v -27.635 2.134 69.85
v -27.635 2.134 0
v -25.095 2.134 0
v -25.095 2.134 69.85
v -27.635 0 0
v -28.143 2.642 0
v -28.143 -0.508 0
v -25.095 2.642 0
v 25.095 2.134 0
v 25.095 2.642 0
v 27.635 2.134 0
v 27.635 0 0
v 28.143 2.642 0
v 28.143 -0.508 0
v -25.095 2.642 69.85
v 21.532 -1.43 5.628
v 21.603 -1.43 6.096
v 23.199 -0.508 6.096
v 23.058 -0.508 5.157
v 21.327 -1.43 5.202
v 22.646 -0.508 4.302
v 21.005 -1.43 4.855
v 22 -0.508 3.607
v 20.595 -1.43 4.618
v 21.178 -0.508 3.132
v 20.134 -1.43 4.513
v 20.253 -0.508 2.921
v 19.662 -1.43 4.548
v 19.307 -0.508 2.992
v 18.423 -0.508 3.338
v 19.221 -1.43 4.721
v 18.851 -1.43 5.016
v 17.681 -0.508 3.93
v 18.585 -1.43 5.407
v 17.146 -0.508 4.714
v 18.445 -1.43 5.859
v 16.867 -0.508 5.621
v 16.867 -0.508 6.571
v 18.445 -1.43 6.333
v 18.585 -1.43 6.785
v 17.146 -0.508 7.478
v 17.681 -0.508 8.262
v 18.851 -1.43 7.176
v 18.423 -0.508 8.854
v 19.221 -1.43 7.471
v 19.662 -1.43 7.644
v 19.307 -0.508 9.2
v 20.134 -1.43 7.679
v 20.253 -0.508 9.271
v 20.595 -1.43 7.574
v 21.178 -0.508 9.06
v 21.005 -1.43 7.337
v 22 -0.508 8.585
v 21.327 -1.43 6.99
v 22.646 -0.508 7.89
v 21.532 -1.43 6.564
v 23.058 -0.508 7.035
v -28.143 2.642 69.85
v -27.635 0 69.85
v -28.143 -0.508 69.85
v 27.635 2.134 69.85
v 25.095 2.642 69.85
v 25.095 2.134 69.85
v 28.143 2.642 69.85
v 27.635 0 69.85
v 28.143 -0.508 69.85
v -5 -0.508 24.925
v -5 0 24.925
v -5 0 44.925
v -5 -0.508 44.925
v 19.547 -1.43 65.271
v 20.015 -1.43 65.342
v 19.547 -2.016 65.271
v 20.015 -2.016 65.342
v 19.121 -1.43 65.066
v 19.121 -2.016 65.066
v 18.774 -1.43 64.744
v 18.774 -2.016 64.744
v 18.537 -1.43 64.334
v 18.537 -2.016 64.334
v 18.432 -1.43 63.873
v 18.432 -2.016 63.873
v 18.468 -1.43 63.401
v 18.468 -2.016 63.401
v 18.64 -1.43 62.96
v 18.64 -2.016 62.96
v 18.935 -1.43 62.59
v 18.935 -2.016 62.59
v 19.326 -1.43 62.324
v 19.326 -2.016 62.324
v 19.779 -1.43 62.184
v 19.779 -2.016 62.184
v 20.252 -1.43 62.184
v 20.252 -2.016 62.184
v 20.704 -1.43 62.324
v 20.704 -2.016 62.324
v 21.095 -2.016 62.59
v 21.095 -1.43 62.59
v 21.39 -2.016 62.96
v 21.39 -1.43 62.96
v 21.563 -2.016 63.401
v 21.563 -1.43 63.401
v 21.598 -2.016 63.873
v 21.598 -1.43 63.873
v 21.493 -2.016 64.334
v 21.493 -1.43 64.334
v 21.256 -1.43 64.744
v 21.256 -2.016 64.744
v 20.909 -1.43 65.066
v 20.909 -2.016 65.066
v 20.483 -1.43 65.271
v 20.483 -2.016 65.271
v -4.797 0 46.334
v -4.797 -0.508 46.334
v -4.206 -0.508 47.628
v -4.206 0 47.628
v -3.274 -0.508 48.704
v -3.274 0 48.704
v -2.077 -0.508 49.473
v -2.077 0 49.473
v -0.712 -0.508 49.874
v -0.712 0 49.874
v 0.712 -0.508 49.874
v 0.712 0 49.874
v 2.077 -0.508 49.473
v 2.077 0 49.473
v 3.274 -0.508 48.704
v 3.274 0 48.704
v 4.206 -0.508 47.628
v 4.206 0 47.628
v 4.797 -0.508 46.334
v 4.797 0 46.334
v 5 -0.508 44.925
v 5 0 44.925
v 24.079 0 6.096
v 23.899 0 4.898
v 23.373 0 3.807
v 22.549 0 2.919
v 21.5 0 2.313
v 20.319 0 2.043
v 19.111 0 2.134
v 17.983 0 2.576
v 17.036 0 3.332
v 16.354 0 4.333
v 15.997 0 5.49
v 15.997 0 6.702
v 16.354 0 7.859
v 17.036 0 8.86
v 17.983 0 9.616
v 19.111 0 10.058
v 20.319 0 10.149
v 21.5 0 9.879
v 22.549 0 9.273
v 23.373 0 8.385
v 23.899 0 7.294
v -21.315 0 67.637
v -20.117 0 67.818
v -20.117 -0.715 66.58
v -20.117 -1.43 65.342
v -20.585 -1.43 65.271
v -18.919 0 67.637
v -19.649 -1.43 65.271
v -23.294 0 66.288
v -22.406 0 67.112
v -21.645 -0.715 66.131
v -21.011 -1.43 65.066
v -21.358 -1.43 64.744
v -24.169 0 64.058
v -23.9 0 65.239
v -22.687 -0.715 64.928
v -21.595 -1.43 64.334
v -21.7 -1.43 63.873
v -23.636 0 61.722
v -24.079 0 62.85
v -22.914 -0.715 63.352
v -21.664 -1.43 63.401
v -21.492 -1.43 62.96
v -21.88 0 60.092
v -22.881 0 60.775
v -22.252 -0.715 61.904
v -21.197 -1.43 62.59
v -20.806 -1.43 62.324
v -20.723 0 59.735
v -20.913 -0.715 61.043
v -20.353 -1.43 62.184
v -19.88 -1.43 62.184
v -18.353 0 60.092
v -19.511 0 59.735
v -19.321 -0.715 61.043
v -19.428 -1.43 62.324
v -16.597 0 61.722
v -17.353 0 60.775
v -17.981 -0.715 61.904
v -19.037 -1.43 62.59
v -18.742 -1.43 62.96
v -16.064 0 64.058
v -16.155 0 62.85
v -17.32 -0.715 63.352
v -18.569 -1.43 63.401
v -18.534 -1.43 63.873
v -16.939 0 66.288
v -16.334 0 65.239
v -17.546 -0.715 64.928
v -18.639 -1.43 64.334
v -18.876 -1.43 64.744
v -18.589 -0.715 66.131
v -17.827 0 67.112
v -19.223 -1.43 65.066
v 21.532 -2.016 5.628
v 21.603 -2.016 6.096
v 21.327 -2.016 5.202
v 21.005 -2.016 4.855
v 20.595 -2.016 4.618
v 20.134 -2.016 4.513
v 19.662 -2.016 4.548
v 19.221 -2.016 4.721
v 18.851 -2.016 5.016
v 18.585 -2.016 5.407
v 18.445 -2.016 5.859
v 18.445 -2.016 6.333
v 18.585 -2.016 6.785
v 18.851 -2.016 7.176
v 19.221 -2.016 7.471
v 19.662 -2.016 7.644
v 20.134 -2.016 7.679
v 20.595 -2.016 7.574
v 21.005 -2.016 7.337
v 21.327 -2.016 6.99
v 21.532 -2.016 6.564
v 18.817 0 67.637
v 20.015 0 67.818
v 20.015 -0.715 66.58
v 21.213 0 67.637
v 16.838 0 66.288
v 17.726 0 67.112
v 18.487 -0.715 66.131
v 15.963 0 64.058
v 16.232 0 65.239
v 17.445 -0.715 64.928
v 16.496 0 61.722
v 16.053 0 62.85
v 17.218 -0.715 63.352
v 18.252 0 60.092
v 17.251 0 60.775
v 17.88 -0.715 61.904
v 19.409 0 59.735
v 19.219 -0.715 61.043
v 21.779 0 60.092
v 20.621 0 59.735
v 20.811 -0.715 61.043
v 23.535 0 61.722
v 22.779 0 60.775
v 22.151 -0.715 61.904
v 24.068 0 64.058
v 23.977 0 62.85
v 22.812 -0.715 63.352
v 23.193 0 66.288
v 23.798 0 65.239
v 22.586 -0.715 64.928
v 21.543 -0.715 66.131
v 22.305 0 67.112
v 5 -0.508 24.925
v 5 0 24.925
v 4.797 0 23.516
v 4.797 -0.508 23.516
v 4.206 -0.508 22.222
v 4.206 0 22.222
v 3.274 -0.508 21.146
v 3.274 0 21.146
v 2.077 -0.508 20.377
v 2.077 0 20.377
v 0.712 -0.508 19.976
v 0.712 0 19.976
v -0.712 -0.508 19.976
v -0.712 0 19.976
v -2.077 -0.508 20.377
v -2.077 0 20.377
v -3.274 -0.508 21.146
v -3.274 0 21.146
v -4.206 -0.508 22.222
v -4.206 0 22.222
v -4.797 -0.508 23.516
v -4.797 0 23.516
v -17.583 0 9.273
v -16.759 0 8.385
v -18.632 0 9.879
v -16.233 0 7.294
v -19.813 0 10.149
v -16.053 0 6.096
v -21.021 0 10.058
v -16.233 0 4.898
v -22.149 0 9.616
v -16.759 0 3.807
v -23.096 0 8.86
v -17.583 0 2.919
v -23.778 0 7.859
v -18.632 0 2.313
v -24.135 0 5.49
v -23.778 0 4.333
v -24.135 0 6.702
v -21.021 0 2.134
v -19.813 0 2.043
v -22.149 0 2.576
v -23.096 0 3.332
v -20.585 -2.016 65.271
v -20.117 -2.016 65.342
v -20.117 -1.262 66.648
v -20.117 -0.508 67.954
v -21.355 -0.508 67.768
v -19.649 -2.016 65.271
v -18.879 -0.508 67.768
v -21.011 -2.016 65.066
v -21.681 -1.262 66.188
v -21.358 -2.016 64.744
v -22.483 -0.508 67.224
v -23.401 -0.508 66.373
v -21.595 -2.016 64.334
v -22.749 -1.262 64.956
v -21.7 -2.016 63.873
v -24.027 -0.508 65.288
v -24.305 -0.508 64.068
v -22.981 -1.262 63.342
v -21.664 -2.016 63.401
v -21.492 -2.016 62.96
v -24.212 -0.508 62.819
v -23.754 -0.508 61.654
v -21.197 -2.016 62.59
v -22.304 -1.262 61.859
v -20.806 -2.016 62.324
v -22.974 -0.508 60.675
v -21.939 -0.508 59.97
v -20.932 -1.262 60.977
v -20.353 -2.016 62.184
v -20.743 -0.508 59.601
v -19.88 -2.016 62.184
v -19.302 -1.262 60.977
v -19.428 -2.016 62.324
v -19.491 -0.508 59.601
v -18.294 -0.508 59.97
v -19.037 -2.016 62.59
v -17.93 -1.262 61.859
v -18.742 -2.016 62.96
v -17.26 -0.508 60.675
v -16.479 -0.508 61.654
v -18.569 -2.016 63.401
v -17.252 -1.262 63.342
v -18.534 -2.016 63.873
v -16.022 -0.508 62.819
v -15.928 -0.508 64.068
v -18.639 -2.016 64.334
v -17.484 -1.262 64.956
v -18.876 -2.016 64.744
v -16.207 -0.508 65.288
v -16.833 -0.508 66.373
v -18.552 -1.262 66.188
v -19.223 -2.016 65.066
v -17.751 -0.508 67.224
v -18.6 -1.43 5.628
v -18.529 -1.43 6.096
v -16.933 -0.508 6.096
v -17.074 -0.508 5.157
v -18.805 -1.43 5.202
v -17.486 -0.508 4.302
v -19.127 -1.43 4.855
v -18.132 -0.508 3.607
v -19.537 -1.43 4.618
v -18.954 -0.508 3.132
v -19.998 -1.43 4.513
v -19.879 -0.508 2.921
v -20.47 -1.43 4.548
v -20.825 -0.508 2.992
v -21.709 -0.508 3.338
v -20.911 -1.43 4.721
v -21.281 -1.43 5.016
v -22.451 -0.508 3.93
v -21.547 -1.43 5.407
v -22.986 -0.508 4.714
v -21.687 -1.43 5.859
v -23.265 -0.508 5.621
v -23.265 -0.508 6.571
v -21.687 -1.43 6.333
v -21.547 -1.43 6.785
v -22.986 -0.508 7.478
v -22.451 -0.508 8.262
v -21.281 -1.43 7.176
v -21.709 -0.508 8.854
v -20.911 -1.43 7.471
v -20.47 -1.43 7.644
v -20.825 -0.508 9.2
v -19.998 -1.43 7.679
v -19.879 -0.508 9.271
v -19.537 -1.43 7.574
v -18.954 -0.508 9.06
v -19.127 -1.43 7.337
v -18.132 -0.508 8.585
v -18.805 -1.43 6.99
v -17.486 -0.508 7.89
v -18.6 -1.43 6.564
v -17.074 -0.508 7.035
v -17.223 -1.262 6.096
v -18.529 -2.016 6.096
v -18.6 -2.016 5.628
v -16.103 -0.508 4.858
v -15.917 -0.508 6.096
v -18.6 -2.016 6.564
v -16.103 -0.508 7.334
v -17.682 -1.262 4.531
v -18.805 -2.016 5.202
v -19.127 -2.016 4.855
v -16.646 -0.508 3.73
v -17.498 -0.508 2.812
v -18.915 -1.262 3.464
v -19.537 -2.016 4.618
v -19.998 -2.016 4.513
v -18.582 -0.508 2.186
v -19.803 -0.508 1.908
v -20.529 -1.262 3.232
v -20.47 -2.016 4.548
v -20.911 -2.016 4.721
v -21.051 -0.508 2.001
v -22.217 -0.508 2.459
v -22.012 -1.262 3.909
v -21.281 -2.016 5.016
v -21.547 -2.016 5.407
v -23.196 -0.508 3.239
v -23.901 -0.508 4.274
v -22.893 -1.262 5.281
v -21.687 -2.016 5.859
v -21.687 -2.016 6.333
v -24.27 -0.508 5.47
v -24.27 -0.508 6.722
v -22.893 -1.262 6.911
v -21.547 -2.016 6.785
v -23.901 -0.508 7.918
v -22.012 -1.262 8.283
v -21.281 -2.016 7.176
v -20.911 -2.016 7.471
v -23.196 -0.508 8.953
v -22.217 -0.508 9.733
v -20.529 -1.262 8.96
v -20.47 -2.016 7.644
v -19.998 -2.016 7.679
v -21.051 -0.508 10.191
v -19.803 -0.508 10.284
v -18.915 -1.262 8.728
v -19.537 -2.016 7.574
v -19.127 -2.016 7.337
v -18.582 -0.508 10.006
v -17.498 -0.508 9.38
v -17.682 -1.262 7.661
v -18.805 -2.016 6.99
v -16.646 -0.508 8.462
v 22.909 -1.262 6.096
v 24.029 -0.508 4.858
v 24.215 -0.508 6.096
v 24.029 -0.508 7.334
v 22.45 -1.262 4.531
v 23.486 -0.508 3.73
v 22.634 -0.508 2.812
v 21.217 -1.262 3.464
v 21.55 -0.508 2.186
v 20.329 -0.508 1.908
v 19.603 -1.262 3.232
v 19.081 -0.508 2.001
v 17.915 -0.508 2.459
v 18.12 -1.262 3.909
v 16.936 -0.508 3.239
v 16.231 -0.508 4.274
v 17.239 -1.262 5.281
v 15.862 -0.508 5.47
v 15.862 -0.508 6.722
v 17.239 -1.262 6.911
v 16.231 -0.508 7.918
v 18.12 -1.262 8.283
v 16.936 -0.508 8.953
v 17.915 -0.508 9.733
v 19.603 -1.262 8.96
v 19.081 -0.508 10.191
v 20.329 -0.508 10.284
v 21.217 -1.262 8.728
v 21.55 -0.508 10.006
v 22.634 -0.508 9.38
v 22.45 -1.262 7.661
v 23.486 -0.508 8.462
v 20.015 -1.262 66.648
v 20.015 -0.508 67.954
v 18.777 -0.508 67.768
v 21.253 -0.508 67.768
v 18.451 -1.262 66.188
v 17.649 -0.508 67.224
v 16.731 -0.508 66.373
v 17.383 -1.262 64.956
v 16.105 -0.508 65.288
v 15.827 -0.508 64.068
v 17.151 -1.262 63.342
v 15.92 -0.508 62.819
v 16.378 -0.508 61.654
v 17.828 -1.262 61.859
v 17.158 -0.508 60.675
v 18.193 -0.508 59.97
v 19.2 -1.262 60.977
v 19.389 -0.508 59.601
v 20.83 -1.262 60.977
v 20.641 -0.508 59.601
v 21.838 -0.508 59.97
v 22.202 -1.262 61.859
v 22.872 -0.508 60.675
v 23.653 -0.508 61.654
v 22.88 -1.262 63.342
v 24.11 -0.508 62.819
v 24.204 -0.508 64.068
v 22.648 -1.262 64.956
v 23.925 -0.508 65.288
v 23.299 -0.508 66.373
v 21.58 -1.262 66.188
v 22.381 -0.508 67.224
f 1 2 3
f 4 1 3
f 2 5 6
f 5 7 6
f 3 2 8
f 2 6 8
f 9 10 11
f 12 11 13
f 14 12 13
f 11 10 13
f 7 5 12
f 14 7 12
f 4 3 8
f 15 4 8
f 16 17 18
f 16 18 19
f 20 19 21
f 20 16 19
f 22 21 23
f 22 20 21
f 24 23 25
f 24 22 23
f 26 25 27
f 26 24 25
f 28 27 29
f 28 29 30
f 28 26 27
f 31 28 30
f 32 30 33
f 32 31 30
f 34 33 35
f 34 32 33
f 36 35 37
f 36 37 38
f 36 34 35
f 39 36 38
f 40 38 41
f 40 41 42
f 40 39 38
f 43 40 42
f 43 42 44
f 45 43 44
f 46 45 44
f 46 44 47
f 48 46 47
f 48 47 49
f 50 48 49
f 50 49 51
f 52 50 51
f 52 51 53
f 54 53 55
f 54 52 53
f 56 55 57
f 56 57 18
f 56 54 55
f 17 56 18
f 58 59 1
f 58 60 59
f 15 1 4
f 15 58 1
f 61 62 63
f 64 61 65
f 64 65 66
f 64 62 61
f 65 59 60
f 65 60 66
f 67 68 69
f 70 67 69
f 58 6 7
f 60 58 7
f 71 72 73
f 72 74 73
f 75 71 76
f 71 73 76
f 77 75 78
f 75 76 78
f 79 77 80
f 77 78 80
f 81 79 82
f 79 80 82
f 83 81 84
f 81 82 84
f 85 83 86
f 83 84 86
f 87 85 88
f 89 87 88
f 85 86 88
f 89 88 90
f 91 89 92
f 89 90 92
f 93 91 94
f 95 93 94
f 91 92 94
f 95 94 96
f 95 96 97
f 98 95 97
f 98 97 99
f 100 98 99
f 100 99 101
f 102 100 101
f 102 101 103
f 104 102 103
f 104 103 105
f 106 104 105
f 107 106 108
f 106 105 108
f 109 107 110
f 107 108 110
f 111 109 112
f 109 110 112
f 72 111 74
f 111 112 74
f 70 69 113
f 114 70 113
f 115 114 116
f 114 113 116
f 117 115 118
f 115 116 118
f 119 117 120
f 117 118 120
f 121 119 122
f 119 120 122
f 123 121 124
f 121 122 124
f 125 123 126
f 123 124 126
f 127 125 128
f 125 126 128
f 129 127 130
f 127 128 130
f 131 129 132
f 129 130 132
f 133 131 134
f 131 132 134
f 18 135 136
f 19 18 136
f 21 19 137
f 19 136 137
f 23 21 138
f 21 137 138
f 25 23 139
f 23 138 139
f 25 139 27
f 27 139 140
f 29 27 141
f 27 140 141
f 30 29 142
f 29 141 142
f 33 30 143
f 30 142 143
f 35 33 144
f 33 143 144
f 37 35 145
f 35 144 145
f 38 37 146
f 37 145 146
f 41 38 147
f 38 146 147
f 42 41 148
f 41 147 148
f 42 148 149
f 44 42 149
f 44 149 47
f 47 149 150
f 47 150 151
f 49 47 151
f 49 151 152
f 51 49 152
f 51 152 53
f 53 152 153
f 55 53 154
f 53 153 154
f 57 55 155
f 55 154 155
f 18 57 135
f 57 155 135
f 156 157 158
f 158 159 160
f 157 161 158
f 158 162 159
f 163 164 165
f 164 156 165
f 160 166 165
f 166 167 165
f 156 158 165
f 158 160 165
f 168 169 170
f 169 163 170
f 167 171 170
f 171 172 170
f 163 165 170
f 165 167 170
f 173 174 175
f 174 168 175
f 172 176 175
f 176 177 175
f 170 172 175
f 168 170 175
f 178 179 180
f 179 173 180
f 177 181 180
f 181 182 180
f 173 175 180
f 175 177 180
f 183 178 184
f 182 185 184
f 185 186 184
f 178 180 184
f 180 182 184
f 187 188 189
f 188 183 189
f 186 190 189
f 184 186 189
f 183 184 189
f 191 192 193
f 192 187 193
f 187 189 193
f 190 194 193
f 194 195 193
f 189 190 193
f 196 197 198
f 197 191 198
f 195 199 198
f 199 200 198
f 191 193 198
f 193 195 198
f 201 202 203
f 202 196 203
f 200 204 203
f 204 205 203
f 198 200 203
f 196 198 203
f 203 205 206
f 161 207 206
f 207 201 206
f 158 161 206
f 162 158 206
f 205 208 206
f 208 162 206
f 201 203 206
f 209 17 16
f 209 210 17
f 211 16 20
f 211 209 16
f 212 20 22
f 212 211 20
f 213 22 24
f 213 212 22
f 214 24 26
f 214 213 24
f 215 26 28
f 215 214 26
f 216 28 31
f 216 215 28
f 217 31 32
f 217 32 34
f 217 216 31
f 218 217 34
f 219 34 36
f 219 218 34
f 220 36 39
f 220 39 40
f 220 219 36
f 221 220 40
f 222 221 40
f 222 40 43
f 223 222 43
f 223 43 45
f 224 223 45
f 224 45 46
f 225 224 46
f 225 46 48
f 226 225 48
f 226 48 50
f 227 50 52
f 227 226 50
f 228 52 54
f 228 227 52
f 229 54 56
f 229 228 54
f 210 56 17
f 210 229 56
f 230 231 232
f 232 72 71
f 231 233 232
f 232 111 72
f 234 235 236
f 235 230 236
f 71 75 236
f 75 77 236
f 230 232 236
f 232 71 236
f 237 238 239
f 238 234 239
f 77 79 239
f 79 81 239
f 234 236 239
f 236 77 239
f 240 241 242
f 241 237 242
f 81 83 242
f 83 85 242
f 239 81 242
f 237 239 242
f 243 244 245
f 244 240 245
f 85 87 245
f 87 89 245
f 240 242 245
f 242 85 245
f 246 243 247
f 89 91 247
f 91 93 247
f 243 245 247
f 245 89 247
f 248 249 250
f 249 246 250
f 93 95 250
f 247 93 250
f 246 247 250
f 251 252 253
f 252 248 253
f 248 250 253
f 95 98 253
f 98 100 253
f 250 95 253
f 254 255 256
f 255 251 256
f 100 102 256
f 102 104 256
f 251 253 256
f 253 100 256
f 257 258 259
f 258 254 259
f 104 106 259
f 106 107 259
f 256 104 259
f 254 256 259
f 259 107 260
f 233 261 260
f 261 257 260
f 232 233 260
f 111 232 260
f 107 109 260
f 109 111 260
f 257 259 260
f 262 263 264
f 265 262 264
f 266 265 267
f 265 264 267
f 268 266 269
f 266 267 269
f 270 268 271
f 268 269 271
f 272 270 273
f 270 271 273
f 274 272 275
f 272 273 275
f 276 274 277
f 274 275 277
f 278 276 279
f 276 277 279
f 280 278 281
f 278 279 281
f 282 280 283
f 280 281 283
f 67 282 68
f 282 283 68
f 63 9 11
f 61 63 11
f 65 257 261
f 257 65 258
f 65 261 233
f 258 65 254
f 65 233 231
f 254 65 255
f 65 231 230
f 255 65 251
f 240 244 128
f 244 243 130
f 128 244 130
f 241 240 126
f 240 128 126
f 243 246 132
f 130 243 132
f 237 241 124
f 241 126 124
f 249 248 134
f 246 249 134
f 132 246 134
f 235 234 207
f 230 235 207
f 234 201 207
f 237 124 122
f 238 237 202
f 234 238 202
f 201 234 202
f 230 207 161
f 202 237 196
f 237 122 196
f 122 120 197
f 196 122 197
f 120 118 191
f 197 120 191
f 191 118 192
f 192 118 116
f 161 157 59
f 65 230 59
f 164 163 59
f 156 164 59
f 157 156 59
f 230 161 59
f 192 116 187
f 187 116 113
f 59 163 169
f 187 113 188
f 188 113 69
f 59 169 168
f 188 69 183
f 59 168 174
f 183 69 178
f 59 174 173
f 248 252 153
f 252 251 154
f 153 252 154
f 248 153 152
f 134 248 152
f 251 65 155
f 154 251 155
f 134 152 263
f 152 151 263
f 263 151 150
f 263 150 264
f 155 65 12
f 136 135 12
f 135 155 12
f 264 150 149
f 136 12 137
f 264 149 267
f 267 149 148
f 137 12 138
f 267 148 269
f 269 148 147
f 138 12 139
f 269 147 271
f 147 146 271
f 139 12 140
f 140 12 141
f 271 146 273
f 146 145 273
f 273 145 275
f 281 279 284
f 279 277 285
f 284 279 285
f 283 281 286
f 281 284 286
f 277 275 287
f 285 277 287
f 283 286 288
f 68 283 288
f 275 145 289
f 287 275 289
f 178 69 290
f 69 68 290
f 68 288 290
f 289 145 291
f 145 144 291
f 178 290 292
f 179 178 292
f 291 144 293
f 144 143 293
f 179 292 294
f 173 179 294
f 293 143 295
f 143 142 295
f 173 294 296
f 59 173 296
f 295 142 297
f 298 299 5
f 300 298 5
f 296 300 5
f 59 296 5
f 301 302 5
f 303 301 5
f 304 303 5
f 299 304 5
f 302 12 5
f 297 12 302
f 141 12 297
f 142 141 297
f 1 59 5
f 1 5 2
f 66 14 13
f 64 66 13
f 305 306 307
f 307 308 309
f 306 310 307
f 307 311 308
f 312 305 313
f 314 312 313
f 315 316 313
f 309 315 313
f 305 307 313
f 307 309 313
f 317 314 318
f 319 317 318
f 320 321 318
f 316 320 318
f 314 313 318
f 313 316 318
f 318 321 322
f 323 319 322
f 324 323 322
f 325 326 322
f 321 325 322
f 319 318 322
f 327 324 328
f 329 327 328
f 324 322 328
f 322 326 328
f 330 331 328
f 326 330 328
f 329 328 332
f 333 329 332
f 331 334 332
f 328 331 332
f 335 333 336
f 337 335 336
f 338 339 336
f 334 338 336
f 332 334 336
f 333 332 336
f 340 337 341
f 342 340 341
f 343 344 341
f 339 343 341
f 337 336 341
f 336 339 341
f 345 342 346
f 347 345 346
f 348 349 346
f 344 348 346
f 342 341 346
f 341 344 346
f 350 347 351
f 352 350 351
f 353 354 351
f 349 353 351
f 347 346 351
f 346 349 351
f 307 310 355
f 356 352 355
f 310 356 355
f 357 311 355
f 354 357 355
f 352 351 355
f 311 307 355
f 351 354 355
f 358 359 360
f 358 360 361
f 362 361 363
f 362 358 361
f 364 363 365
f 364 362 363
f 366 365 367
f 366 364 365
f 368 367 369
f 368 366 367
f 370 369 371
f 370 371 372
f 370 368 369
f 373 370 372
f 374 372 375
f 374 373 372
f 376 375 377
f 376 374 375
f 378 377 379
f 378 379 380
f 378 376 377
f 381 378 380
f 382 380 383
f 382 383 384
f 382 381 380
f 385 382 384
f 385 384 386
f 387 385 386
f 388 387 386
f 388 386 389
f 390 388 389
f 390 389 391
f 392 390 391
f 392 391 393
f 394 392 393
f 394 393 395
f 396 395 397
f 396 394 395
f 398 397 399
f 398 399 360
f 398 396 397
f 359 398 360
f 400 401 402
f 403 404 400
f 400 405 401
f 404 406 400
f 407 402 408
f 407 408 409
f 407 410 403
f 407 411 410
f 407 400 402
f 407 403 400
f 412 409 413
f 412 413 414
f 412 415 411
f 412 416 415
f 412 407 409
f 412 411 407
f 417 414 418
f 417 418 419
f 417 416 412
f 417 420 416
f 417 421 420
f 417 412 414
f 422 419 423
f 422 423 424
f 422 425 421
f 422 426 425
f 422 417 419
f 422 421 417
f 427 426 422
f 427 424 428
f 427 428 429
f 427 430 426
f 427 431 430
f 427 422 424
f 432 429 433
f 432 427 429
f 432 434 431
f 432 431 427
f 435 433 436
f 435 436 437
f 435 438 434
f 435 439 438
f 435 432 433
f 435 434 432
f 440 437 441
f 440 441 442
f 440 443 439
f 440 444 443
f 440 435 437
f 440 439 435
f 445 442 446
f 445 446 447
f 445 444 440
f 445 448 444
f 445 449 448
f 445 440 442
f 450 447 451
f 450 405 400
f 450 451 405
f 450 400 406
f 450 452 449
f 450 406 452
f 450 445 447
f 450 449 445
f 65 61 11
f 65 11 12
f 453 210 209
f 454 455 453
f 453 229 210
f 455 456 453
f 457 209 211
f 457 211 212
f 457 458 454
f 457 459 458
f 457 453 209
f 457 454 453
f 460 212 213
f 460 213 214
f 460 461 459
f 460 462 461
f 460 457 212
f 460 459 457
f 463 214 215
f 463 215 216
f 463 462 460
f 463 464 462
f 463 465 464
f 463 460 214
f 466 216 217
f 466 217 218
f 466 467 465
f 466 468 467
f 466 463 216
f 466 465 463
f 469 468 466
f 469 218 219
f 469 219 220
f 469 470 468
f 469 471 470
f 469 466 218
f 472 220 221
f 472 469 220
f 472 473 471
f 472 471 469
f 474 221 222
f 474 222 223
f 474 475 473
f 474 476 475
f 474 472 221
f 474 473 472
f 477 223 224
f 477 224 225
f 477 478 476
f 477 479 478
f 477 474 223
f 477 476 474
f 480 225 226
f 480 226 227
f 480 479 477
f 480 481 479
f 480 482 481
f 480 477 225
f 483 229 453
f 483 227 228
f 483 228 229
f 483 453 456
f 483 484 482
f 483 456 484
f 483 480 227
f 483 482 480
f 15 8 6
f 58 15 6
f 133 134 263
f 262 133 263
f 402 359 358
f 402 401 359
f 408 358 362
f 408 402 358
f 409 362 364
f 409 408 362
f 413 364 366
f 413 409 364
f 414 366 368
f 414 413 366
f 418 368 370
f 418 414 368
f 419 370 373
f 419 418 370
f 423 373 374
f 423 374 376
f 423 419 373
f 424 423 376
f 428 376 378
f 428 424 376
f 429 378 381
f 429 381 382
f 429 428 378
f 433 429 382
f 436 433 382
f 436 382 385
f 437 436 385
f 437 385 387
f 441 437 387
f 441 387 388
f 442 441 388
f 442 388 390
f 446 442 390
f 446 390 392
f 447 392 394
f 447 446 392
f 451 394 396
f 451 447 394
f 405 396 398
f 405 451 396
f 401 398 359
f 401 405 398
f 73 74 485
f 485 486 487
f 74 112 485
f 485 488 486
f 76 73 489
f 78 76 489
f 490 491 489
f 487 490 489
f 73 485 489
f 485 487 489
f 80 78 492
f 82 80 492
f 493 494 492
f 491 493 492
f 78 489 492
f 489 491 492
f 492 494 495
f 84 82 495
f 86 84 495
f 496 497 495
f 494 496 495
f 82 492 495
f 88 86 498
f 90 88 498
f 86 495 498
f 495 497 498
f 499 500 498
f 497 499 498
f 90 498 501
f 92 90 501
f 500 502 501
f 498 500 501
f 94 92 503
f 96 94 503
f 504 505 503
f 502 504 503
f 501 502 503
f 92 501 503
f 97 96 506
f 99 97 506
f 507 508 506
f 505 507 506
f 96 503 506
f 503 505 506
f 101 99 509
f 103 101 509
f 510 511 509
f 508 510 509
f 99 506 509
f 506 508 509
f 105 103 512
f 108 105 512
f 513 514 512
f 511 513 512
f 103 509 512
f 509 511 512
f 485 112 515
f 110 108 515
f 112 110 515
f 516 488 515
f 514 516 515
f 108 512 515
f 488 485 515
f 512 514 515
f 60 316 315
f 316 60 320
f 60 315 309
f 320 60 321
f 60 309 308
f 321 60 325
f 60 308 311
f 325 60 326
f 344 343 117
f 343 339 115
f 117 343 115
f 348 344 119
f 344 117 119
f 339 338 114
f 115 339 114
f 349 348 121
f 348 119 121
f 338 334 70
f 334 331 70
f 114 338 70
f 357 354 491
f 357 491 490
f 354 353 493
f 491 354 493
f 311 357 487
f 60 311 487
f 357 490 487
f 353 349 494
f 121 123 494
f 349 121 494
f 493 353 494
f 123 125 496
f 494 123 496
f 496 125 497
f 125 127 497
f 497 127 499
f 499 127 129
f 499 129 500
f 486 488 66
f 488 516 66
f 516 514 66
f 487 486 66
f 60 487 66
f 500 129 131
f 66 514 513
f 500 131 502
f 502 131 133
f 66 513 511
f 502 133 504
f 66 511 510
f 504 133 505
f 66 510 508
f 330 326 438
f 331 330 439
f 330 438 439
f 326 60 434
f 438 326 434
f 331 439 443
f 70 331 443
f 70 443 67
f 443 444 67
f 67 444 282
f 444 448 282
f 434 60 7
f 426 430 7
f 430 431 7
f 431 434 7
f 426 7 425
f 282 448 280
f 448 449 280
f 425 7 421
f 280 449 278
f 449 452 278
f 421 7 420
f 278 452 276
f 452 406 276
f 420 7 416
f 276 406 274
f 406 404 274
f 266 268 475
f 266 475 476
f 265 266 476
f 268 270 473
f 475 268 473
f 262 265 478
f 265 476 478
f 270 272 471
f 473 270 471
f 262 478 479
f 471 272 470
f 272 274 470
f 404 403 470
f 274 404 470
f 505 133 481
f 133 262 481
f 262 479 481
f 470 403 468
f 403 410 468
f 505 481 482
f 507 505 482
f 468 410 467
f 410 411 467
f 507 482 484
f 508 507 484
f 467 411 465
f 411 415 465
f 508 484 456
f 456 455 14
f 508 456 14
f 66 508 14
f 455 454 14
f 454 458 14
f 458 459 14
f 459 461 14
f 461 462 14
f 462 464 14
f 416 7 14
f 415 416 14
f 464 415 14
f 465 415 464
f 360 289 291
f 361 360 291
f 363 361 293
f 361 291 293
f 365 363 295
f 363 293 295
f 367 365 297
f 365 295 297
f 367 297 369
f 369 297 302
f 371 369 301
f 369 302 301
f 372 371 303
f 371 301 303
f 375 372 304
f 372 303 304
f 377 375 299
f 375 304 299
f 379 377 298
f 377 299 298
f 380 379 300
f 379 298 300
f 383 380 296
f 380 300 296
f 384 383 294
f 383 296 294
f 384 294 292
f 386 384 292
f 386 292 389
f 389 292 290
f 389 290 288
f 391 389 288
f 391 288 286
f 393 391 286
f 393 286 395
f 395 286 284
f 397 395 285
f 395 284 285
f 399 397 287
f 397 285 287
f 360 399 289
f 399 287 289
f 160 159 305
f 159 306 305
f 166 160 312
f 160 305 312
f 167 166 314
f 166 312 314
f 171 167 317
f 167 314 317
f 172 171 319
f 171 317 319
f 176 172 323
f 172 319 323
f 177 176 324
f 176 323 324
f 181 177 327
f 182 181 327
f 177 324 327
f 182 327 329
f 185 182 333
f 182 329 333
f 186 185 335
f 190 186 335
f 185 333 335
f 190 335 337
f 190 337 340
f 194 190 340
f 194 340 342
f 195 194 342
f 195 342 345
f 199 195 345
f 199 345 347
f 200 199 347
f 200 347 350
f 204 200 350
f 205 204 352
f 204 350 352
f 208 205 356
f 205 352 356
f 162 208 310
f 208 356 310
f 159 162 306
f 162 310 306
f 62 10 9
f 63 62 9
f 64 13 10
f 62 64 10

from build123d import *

# Parameters (mm, degrees)
EXTRUDE_THIN3_DEPTH     = 69.85
CUT_EXTRUDE1_DEPTH      = 76.372290574
CUT_EXTRUDE1_DEPTH_BACK = 76.372290574
SKETCH9_R               = 4.064
CUT_EXTRUDE2_DEPTH      = 2.54
LPATTERN1_COUNT         = 2
LPATTERN1_PITCH         = 40.132


# Read off the part's stored shape, not the designer's step: Mirror1
with BuildPart() as part:
    # Sketch6 → Extrude-Thin3 (new body)
    with BuildSketch(Plane.XY):
        Polygon((25.0952, 2.1336), (27.6352, 2.1336), (27.6352, 0), (-27.6352, 0), (-27.6352, 2.1336), (-25.0952, 2.1336), (-25.0952, 2.6416), (-28.1432, 2.6416), (-28.1432, -0.508), (28.1432, -0.508), (28.1432, 2.6416), (25.0952, 2.6416), align=None)
    extrude(amount=EXTRUDE_THIN3_DEPTH)

    # Sketch8 → Cut-Extrude1 (cut, two sides: drawn at the far end of the back side and taken through both)
    with BuildSketch(Plane.XZ.offset(0.508).offset(-CUT_EXTRUDE1_DEPTH_BACK)):
        with BuildLine():
            Line((5, 44.925), (5, 24.925))
            ThreePointArc((5, 24.925), (0, 19.925), (-5, 24.925))
            Line((-5, 24.925), (-5, 44.925))
            ThreePointArc((-5, 44.925), (0, 49.925), (5, 44.925))
        make_face()
    extrude(amount=CUT_EXTRUDE1_DEPTH + CUT_EXTRUDE1_DEPTH_BACK, mode=Mode.SUBTRACT)

    # Sketch9 → Cut-Extrude2 (cut)
    with BuildSketch(Plane.XZ.offset(0.508)):
        with Locations(Location((20.0152, 63.754, 0), (0, 0, 270))):
            Circle(SKETCH9_R)
    cut_extrude2 = extrude(amount=-CUT_EXTRUDE2_DEPTH, mode=Mode.SUBTRACT)

    # Sketch10 → Revolve1 (revolve)
    with BuildSketch(Plane(origin=(0, 0, 63.754), x_dir=(0, -1, 0), z_dir=(0, 0, 1)), mode=Mode.PRIVATE) as revolve1_sk:
        Polygon((0, 24.0792), (1.429807942, 21.6027), (2.016395815, 21.6027), (0, 25.0952), align=None)
    revolve1 = revolve(revolve1_sk.sketch.rotate(Axis((20.0152, 10.109887768, 63.754), (0, -1, 0)), 90), axis=Axis((20.0152, 10.109887768, 63.754), (0, -1, 0)))

    # LPattern1: Cut-Extrude2, Revolve1 ×2
    with Locations(*[(-i * LPATTERN1_PITCH, 0, 0) for i in range(1, LPATTERN1_COUNT)]):
        add(cut_extrude2, mode=Mode.SUBTRACT)
        add(revolve1)

    # Mirror1 outline → Mirror1 (revolve)
    with BuildSketch(Plane(origin=(20.0152, 0, 6.096), x_dir=(1, 0, 0), z_dir=(0, 0, 1))):
        Polygon((3.18411819, -0.508), (1.5875, -1.429807942), (1.5875, -2.016395815), (4.20011819, -0.508), align=None)
    revolve(axis=Axis((20.0152, 0, 6.096), (0, 1, 0)))

    # Mirror1 2 outline → Mirror1 2 (revolve)
    with BuildSketch(Plane(origin=(-20.1168, 0, 6.096), x_dir=(1, 0, 0), z_dir=(0, 0, 1))):
        Polygon((3.18411819, -0.508), (1.5875, -1.429807942), (1.5875, -2.016395815), (4.20011819, -0.508), align=None)
    revolve(axis=Axis((-20.1168, 0, 6.096), (0, 1, 0)))

    # Mirror1 3 outline → Mirror1 3 (revolve, cut)
    with BuildSketch(Plane(origin=(20.0152, 0, 6.096), x_dir=(1, 0, 0), z_dir=(0, 0, 1))):
        Polygon((3.18411819, -0.508), (4.064, 0), (0, 0), (0, -0.508), align=None)
    revolve(axis=Axis((20.0152, 0, 6.096), (0, 1, 0)), mode=Mode.SUBTRACT)

    # Mirror1 4 outline → Mirror1 4 (revolve, cut)
    with BuildSketch(Plane(origin=(-20.1168, 0, 6.096), x_dir=(1, 0, 0), z_dir=(0, 0, 1))):
        Polygon((3.18411819, -0.508), (4.064, 0), (0, 0), (0, -0.508), align=None)
    revolve(axis=Axis((-20.1168, 0, 6.096), (0, 1, 0)), mode=Mode.SUBTRACT)


solid = part.part
